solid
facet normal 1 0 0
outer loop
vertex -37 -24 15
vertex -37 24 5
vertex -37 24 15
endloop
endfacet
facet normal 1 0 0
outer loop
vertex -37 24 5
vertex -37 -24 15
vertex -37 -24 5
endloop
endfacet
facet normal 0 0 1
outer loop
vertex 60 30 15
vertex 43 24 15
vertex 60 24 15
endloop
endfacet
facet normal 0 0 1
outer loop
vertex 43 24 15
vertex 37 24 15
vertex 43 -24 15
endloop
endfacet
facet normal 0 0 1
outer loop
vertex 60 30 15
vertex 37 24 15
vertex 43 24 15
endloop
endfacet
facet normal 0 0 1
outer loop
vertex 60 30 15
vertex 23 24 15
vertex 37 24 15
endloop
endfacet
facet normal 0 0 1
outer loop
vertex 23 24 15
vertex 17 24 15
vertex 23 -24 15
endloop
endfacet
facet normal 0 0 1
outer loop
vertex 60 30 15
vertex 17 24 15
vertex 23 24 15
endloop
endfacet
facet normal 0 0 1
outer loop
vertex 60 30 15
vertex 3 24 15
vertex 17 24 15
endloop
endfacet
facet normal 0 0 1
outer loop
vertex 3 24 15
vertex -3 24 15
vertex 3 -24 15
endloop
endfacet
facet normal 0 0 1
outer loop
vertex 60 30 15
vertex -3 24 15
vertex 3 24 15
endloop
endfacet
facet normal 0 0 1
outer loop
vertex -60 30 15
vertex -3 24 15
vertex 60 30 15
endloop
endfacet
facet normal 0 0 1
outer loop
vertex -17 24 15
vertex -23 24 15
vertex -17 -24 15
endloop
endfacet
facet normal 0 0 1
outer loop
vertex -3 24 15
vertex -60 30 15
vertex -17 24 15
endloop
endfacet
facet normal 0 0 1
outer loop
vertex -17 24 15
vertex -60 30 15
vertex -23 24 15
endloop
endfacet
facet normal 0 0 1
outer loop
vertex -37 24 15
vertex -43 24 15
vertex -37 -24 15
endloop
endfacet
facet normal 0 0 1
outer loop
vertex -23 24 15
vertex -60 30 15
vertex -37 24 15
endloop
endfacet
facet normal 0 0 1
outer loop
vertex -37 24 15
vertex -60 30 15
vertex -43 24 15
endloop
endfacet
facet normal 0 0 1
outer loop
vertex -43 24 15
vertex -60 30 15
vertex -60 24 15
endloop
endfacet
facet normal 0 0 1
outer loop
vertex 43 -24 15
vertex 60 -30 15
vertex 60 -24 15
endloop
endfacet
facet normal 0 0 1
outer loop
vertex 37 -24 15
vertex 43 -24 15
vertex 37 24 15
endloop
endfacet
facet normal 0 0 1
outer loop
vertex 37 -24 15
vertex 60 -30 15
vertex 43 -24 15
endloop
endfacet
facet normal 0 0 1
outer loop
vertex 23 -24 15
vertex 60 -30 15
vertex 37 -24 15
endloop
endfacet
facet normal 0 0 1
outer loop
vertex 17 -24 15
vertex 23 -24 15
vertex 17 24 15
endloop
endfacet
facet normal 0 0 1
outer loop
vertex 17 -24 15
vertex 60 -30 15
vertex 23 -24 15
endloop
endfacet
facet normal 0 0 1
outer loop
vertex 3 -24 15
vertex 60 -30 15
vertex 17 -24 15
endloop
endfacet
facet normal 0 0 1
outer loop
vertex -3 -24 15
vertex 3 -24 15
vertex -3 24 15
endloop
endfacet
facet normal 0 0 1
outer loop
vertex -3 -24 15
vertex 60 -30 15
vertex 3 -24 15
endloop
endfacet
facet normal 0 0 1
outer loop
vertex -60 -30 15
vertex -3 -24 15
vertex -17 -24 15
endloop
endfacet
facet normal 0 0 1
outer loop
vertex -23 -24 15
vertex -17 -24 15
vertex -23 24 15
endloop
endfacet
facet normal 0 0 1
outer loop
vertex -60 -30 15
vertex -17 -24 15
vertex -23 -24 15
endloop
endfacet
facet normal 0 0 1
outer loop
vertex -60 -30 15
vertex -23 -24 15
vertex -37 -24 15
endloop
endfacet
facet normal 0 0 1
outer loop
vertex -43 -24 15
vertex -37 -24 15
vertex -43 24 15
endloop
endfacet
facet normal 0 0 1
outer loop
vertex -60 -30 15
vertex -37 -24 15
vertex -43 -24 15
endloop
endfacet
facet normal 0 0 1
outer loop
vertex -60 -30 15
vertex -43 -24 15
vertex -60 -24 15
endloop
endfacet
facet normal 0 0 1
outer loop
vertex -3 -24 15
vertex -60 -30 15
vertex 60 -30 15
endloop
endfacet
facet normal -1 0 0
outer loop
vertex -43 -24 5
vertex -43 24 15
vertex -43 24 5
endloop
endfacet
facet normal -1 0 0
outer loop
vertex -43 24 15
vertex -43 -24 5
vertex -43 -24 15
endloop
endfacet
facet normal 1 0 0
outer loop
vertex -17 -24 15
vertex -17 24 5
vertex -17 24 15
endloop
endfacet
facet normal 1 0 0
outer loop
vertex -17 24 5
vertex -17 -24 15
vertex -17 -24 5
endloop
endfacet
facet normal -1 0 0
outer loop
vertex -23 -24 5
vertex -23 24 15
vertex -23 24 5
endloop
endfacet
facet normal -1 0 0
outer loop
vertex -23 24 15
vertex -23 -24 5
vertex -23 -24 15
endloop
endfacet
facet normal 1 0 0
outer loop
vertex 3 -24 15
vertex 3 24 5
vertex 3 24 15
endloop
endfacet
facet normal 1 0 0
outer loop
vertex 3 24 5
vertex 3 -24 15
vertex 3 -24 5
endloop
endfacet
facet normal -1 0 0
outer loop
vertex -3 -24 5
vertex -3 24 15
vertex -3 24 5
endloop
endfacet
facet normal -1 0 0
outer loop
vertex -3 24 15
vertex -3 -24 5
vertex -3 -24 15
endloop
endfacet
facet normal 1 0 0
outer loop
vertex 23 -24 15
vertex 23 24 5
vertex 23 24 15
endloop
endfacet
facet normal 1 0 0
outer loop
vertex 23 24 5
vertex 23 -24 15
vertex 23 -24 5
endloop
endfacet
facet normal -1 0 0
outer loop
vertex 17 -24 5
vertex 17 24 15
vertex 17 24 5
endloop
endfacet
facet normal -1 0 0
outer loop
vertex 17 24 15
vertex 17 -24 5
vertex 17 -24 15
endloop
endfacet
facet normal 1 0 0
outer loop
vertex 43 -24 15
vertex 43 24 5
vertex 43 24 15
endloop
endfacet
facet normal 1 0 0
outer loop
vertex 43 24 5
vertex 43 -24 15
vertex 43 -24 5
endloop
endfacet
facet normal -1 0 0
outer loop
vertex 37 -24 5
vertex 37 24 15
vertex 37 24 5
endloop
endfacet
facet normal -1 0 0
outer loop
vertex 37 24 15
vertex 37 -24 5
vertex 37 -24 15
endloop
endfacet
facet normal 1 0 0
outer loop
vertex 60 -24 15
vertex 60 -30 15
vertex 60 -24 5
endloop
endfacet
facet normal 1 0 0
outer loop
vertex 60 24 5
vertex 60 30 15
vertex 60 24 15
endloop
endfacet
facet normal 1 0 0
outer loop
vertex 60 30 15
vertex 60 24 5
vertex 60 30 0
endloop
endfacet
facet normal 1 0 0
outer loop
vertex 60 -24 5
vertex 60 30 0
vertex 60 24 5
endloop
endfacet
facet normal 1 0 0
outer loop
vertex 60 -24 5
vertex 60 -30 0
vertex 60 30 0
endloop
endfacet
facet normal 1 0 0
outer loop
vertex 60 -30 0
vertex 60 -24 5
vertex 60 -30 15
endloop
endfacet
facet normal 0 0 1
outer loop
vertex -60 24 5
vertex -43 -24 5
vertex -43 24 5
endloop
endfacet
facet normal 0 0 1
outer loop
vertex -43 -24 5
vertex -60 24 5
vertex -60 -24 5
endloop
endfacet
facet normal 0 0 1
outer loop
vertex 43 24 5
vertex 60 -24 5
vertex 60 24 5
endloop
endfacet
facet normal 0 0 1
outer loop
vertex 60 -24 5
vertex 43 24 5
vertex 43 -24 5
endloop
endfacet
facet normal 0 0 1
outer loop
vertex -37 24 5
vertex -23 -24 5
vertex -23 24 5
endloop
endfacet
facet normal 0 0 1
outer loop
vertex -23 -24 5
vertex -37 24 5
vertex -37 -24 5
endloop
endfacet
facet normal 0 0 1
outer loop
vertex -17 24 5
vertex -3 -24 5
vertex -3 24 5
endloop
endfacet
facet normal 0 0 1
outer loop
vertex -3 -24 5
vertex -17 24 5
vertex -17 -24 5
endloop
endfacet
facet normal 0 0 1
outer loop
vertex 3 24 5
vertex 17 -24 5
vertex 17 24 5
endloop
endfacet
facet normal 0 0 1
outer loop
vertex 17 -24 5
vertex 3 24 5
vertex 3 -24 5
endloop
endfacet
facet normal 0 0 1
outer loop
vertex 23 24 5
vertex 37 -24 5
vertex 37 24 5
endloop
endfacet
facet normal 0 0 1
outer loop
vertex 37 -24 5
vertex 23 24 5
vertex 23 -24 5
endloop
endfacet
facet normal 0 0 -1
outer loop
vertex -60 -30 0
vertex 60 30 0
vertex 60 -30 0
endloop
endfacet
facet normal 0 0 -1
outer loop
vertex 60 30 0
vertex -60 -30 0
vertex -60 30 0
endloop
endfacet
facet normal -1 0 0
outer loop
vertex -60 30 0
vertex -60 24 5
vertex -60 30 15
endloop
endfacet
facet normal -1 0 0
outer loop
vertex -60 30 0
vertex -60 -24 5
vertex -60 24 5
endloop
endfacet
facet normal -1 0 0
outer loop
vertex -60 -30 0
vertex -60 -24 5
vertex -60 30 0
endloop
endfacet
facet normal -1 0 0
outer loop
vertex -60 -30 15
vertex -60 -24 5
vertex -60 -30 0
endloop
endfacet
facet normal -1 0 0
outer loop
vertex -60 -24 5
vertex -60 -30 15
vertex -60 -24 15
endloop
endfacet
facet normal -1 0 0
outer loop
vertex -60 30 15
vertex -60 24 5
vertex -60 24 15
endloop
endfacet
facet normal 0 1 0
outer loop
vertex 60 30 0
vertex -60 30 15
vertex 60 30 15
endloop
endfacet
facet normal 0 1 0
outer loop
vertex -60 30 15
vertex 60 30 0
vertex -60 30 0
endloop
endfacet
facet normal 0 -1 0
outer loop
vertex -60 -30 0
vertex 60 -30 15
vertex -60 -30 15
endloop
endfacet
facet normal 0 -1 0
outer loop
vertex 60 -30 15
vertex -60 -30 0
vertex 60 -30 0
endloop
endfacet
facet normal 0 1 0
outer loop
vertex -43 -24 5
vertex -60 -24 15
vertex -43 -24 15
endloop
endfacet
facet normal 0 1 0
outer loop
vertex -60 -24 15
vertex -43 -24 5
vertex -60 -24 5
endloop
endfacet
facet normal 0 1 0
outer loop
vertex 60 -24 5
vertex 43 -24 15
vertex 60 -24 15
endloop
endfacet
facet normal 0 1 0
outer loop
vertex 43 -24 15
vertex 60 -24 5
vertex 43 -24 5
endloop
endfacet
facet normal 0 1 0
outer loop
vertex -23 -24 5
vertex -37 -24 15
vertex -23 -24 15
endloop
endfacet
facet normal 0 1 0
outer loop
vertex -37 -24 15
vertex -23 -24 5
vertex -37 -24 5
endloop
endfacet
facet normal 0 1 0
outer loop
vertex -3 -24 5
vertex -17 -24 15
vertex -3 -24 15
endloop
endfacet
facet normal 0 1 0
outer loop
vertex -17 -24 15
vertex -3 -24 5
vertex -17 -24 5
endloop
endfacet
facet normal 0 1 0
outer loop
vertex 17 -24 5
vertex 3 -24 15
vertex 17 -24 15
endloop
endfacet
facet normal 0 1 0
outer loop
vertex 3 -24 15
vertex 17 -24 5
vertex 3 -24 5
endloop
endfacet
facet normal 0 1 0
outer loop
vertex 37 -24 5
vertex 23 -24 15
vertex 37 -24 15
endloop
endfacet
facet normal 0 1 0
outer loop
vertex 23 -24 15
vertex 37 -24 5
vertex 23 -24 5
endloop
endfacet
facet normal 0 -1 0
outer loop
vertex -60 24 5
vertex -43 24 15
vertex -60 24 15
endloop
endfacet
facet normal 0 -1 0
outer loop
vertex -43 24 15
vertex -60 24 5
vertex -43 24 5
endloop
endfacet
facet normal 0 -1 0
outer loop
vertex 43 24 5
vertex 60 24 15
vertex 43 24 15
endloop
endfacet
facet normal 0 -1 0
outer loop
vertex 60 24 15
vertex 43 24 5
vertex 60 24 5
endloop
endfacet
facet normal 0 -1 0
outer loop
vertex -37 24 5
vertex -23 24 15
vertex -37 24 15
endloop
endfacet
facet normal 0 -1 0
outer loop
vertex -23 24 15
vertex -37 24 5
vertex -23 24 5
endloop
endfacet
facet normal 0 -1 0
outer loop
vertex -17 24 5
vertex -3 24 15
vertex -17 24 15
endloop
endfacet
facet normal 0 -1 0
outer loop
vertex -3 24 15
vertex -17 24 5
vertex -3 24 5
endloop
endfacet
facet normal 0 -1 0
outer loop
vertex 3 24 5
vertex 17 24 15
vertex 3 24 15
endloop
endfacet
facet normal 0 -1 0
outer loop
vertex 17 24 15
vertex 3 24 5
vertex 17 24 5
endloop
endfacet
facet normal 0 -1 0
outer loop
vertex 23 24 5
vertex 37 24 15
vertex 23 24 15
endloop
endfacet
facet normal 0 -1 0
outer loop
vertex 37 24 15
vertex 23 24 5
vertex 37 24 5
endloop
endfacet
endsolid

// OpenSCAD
$fn = 32;

// ----------------------------------------------------------------------
// Rib frame 120 x 60 x 15
// 5 ribs at 20 mm pitch
// ----------------------------------------------------------------------

// --- parameters (mm) ---
frame = [120, 60, 5];  // base plate size (x, y, z)
rail_w = 6;            // side rail width
ribs = 5;              // number of ribs
rib_t = 6;             // rib thickness
rib_h = 10;            // rib height above the base plate
pitch = 20;            // pitch between rib centres

// --- derived feature positions (mm) ---
span = (ribs - 1) * pitch;          // = 80   distance between the outer ribs
origin_x = -span / 2;               // = -40   X of the first rib
rib_len = frame[1] - 2 * rail_w + 2;  // = 50   rib length, 1 mm into each rail
feature_centers = [
  [origin_x + 0 * pitch, 0],
  [origin_x + 1 * pitch, 0],
  [origin_x + 2 * pitch, 0],
  [origin_x + 3 * pitch, 0],
  [origin_x + 4 * pitch, 0]
];   // rib centre line, drives the rib loop

// base plate, two side rails, then the ribs read straight off feature_centers
union() {
  translate([-frame[0] / 2, -frame[1] / 2, 0]) cube(frame);
  translate([-frame[0] / 2, -frame[1] / 2, 0]) cube([frame[0], rail_w, frame[2] + rib_h]);
  translate([-frame[0] / 2, frame[1] / 2 - rail_w, 0]) cube([frame[0], rail_w, frame[2] + rib_h]);
  for (centre = feature_centers)
    translate([centre[0] - rib_t / 2, centre[1] - rib_len / 2, frame[2] - 1])
      cube([rib_t, rib_len, rib_h + 1]);
}
